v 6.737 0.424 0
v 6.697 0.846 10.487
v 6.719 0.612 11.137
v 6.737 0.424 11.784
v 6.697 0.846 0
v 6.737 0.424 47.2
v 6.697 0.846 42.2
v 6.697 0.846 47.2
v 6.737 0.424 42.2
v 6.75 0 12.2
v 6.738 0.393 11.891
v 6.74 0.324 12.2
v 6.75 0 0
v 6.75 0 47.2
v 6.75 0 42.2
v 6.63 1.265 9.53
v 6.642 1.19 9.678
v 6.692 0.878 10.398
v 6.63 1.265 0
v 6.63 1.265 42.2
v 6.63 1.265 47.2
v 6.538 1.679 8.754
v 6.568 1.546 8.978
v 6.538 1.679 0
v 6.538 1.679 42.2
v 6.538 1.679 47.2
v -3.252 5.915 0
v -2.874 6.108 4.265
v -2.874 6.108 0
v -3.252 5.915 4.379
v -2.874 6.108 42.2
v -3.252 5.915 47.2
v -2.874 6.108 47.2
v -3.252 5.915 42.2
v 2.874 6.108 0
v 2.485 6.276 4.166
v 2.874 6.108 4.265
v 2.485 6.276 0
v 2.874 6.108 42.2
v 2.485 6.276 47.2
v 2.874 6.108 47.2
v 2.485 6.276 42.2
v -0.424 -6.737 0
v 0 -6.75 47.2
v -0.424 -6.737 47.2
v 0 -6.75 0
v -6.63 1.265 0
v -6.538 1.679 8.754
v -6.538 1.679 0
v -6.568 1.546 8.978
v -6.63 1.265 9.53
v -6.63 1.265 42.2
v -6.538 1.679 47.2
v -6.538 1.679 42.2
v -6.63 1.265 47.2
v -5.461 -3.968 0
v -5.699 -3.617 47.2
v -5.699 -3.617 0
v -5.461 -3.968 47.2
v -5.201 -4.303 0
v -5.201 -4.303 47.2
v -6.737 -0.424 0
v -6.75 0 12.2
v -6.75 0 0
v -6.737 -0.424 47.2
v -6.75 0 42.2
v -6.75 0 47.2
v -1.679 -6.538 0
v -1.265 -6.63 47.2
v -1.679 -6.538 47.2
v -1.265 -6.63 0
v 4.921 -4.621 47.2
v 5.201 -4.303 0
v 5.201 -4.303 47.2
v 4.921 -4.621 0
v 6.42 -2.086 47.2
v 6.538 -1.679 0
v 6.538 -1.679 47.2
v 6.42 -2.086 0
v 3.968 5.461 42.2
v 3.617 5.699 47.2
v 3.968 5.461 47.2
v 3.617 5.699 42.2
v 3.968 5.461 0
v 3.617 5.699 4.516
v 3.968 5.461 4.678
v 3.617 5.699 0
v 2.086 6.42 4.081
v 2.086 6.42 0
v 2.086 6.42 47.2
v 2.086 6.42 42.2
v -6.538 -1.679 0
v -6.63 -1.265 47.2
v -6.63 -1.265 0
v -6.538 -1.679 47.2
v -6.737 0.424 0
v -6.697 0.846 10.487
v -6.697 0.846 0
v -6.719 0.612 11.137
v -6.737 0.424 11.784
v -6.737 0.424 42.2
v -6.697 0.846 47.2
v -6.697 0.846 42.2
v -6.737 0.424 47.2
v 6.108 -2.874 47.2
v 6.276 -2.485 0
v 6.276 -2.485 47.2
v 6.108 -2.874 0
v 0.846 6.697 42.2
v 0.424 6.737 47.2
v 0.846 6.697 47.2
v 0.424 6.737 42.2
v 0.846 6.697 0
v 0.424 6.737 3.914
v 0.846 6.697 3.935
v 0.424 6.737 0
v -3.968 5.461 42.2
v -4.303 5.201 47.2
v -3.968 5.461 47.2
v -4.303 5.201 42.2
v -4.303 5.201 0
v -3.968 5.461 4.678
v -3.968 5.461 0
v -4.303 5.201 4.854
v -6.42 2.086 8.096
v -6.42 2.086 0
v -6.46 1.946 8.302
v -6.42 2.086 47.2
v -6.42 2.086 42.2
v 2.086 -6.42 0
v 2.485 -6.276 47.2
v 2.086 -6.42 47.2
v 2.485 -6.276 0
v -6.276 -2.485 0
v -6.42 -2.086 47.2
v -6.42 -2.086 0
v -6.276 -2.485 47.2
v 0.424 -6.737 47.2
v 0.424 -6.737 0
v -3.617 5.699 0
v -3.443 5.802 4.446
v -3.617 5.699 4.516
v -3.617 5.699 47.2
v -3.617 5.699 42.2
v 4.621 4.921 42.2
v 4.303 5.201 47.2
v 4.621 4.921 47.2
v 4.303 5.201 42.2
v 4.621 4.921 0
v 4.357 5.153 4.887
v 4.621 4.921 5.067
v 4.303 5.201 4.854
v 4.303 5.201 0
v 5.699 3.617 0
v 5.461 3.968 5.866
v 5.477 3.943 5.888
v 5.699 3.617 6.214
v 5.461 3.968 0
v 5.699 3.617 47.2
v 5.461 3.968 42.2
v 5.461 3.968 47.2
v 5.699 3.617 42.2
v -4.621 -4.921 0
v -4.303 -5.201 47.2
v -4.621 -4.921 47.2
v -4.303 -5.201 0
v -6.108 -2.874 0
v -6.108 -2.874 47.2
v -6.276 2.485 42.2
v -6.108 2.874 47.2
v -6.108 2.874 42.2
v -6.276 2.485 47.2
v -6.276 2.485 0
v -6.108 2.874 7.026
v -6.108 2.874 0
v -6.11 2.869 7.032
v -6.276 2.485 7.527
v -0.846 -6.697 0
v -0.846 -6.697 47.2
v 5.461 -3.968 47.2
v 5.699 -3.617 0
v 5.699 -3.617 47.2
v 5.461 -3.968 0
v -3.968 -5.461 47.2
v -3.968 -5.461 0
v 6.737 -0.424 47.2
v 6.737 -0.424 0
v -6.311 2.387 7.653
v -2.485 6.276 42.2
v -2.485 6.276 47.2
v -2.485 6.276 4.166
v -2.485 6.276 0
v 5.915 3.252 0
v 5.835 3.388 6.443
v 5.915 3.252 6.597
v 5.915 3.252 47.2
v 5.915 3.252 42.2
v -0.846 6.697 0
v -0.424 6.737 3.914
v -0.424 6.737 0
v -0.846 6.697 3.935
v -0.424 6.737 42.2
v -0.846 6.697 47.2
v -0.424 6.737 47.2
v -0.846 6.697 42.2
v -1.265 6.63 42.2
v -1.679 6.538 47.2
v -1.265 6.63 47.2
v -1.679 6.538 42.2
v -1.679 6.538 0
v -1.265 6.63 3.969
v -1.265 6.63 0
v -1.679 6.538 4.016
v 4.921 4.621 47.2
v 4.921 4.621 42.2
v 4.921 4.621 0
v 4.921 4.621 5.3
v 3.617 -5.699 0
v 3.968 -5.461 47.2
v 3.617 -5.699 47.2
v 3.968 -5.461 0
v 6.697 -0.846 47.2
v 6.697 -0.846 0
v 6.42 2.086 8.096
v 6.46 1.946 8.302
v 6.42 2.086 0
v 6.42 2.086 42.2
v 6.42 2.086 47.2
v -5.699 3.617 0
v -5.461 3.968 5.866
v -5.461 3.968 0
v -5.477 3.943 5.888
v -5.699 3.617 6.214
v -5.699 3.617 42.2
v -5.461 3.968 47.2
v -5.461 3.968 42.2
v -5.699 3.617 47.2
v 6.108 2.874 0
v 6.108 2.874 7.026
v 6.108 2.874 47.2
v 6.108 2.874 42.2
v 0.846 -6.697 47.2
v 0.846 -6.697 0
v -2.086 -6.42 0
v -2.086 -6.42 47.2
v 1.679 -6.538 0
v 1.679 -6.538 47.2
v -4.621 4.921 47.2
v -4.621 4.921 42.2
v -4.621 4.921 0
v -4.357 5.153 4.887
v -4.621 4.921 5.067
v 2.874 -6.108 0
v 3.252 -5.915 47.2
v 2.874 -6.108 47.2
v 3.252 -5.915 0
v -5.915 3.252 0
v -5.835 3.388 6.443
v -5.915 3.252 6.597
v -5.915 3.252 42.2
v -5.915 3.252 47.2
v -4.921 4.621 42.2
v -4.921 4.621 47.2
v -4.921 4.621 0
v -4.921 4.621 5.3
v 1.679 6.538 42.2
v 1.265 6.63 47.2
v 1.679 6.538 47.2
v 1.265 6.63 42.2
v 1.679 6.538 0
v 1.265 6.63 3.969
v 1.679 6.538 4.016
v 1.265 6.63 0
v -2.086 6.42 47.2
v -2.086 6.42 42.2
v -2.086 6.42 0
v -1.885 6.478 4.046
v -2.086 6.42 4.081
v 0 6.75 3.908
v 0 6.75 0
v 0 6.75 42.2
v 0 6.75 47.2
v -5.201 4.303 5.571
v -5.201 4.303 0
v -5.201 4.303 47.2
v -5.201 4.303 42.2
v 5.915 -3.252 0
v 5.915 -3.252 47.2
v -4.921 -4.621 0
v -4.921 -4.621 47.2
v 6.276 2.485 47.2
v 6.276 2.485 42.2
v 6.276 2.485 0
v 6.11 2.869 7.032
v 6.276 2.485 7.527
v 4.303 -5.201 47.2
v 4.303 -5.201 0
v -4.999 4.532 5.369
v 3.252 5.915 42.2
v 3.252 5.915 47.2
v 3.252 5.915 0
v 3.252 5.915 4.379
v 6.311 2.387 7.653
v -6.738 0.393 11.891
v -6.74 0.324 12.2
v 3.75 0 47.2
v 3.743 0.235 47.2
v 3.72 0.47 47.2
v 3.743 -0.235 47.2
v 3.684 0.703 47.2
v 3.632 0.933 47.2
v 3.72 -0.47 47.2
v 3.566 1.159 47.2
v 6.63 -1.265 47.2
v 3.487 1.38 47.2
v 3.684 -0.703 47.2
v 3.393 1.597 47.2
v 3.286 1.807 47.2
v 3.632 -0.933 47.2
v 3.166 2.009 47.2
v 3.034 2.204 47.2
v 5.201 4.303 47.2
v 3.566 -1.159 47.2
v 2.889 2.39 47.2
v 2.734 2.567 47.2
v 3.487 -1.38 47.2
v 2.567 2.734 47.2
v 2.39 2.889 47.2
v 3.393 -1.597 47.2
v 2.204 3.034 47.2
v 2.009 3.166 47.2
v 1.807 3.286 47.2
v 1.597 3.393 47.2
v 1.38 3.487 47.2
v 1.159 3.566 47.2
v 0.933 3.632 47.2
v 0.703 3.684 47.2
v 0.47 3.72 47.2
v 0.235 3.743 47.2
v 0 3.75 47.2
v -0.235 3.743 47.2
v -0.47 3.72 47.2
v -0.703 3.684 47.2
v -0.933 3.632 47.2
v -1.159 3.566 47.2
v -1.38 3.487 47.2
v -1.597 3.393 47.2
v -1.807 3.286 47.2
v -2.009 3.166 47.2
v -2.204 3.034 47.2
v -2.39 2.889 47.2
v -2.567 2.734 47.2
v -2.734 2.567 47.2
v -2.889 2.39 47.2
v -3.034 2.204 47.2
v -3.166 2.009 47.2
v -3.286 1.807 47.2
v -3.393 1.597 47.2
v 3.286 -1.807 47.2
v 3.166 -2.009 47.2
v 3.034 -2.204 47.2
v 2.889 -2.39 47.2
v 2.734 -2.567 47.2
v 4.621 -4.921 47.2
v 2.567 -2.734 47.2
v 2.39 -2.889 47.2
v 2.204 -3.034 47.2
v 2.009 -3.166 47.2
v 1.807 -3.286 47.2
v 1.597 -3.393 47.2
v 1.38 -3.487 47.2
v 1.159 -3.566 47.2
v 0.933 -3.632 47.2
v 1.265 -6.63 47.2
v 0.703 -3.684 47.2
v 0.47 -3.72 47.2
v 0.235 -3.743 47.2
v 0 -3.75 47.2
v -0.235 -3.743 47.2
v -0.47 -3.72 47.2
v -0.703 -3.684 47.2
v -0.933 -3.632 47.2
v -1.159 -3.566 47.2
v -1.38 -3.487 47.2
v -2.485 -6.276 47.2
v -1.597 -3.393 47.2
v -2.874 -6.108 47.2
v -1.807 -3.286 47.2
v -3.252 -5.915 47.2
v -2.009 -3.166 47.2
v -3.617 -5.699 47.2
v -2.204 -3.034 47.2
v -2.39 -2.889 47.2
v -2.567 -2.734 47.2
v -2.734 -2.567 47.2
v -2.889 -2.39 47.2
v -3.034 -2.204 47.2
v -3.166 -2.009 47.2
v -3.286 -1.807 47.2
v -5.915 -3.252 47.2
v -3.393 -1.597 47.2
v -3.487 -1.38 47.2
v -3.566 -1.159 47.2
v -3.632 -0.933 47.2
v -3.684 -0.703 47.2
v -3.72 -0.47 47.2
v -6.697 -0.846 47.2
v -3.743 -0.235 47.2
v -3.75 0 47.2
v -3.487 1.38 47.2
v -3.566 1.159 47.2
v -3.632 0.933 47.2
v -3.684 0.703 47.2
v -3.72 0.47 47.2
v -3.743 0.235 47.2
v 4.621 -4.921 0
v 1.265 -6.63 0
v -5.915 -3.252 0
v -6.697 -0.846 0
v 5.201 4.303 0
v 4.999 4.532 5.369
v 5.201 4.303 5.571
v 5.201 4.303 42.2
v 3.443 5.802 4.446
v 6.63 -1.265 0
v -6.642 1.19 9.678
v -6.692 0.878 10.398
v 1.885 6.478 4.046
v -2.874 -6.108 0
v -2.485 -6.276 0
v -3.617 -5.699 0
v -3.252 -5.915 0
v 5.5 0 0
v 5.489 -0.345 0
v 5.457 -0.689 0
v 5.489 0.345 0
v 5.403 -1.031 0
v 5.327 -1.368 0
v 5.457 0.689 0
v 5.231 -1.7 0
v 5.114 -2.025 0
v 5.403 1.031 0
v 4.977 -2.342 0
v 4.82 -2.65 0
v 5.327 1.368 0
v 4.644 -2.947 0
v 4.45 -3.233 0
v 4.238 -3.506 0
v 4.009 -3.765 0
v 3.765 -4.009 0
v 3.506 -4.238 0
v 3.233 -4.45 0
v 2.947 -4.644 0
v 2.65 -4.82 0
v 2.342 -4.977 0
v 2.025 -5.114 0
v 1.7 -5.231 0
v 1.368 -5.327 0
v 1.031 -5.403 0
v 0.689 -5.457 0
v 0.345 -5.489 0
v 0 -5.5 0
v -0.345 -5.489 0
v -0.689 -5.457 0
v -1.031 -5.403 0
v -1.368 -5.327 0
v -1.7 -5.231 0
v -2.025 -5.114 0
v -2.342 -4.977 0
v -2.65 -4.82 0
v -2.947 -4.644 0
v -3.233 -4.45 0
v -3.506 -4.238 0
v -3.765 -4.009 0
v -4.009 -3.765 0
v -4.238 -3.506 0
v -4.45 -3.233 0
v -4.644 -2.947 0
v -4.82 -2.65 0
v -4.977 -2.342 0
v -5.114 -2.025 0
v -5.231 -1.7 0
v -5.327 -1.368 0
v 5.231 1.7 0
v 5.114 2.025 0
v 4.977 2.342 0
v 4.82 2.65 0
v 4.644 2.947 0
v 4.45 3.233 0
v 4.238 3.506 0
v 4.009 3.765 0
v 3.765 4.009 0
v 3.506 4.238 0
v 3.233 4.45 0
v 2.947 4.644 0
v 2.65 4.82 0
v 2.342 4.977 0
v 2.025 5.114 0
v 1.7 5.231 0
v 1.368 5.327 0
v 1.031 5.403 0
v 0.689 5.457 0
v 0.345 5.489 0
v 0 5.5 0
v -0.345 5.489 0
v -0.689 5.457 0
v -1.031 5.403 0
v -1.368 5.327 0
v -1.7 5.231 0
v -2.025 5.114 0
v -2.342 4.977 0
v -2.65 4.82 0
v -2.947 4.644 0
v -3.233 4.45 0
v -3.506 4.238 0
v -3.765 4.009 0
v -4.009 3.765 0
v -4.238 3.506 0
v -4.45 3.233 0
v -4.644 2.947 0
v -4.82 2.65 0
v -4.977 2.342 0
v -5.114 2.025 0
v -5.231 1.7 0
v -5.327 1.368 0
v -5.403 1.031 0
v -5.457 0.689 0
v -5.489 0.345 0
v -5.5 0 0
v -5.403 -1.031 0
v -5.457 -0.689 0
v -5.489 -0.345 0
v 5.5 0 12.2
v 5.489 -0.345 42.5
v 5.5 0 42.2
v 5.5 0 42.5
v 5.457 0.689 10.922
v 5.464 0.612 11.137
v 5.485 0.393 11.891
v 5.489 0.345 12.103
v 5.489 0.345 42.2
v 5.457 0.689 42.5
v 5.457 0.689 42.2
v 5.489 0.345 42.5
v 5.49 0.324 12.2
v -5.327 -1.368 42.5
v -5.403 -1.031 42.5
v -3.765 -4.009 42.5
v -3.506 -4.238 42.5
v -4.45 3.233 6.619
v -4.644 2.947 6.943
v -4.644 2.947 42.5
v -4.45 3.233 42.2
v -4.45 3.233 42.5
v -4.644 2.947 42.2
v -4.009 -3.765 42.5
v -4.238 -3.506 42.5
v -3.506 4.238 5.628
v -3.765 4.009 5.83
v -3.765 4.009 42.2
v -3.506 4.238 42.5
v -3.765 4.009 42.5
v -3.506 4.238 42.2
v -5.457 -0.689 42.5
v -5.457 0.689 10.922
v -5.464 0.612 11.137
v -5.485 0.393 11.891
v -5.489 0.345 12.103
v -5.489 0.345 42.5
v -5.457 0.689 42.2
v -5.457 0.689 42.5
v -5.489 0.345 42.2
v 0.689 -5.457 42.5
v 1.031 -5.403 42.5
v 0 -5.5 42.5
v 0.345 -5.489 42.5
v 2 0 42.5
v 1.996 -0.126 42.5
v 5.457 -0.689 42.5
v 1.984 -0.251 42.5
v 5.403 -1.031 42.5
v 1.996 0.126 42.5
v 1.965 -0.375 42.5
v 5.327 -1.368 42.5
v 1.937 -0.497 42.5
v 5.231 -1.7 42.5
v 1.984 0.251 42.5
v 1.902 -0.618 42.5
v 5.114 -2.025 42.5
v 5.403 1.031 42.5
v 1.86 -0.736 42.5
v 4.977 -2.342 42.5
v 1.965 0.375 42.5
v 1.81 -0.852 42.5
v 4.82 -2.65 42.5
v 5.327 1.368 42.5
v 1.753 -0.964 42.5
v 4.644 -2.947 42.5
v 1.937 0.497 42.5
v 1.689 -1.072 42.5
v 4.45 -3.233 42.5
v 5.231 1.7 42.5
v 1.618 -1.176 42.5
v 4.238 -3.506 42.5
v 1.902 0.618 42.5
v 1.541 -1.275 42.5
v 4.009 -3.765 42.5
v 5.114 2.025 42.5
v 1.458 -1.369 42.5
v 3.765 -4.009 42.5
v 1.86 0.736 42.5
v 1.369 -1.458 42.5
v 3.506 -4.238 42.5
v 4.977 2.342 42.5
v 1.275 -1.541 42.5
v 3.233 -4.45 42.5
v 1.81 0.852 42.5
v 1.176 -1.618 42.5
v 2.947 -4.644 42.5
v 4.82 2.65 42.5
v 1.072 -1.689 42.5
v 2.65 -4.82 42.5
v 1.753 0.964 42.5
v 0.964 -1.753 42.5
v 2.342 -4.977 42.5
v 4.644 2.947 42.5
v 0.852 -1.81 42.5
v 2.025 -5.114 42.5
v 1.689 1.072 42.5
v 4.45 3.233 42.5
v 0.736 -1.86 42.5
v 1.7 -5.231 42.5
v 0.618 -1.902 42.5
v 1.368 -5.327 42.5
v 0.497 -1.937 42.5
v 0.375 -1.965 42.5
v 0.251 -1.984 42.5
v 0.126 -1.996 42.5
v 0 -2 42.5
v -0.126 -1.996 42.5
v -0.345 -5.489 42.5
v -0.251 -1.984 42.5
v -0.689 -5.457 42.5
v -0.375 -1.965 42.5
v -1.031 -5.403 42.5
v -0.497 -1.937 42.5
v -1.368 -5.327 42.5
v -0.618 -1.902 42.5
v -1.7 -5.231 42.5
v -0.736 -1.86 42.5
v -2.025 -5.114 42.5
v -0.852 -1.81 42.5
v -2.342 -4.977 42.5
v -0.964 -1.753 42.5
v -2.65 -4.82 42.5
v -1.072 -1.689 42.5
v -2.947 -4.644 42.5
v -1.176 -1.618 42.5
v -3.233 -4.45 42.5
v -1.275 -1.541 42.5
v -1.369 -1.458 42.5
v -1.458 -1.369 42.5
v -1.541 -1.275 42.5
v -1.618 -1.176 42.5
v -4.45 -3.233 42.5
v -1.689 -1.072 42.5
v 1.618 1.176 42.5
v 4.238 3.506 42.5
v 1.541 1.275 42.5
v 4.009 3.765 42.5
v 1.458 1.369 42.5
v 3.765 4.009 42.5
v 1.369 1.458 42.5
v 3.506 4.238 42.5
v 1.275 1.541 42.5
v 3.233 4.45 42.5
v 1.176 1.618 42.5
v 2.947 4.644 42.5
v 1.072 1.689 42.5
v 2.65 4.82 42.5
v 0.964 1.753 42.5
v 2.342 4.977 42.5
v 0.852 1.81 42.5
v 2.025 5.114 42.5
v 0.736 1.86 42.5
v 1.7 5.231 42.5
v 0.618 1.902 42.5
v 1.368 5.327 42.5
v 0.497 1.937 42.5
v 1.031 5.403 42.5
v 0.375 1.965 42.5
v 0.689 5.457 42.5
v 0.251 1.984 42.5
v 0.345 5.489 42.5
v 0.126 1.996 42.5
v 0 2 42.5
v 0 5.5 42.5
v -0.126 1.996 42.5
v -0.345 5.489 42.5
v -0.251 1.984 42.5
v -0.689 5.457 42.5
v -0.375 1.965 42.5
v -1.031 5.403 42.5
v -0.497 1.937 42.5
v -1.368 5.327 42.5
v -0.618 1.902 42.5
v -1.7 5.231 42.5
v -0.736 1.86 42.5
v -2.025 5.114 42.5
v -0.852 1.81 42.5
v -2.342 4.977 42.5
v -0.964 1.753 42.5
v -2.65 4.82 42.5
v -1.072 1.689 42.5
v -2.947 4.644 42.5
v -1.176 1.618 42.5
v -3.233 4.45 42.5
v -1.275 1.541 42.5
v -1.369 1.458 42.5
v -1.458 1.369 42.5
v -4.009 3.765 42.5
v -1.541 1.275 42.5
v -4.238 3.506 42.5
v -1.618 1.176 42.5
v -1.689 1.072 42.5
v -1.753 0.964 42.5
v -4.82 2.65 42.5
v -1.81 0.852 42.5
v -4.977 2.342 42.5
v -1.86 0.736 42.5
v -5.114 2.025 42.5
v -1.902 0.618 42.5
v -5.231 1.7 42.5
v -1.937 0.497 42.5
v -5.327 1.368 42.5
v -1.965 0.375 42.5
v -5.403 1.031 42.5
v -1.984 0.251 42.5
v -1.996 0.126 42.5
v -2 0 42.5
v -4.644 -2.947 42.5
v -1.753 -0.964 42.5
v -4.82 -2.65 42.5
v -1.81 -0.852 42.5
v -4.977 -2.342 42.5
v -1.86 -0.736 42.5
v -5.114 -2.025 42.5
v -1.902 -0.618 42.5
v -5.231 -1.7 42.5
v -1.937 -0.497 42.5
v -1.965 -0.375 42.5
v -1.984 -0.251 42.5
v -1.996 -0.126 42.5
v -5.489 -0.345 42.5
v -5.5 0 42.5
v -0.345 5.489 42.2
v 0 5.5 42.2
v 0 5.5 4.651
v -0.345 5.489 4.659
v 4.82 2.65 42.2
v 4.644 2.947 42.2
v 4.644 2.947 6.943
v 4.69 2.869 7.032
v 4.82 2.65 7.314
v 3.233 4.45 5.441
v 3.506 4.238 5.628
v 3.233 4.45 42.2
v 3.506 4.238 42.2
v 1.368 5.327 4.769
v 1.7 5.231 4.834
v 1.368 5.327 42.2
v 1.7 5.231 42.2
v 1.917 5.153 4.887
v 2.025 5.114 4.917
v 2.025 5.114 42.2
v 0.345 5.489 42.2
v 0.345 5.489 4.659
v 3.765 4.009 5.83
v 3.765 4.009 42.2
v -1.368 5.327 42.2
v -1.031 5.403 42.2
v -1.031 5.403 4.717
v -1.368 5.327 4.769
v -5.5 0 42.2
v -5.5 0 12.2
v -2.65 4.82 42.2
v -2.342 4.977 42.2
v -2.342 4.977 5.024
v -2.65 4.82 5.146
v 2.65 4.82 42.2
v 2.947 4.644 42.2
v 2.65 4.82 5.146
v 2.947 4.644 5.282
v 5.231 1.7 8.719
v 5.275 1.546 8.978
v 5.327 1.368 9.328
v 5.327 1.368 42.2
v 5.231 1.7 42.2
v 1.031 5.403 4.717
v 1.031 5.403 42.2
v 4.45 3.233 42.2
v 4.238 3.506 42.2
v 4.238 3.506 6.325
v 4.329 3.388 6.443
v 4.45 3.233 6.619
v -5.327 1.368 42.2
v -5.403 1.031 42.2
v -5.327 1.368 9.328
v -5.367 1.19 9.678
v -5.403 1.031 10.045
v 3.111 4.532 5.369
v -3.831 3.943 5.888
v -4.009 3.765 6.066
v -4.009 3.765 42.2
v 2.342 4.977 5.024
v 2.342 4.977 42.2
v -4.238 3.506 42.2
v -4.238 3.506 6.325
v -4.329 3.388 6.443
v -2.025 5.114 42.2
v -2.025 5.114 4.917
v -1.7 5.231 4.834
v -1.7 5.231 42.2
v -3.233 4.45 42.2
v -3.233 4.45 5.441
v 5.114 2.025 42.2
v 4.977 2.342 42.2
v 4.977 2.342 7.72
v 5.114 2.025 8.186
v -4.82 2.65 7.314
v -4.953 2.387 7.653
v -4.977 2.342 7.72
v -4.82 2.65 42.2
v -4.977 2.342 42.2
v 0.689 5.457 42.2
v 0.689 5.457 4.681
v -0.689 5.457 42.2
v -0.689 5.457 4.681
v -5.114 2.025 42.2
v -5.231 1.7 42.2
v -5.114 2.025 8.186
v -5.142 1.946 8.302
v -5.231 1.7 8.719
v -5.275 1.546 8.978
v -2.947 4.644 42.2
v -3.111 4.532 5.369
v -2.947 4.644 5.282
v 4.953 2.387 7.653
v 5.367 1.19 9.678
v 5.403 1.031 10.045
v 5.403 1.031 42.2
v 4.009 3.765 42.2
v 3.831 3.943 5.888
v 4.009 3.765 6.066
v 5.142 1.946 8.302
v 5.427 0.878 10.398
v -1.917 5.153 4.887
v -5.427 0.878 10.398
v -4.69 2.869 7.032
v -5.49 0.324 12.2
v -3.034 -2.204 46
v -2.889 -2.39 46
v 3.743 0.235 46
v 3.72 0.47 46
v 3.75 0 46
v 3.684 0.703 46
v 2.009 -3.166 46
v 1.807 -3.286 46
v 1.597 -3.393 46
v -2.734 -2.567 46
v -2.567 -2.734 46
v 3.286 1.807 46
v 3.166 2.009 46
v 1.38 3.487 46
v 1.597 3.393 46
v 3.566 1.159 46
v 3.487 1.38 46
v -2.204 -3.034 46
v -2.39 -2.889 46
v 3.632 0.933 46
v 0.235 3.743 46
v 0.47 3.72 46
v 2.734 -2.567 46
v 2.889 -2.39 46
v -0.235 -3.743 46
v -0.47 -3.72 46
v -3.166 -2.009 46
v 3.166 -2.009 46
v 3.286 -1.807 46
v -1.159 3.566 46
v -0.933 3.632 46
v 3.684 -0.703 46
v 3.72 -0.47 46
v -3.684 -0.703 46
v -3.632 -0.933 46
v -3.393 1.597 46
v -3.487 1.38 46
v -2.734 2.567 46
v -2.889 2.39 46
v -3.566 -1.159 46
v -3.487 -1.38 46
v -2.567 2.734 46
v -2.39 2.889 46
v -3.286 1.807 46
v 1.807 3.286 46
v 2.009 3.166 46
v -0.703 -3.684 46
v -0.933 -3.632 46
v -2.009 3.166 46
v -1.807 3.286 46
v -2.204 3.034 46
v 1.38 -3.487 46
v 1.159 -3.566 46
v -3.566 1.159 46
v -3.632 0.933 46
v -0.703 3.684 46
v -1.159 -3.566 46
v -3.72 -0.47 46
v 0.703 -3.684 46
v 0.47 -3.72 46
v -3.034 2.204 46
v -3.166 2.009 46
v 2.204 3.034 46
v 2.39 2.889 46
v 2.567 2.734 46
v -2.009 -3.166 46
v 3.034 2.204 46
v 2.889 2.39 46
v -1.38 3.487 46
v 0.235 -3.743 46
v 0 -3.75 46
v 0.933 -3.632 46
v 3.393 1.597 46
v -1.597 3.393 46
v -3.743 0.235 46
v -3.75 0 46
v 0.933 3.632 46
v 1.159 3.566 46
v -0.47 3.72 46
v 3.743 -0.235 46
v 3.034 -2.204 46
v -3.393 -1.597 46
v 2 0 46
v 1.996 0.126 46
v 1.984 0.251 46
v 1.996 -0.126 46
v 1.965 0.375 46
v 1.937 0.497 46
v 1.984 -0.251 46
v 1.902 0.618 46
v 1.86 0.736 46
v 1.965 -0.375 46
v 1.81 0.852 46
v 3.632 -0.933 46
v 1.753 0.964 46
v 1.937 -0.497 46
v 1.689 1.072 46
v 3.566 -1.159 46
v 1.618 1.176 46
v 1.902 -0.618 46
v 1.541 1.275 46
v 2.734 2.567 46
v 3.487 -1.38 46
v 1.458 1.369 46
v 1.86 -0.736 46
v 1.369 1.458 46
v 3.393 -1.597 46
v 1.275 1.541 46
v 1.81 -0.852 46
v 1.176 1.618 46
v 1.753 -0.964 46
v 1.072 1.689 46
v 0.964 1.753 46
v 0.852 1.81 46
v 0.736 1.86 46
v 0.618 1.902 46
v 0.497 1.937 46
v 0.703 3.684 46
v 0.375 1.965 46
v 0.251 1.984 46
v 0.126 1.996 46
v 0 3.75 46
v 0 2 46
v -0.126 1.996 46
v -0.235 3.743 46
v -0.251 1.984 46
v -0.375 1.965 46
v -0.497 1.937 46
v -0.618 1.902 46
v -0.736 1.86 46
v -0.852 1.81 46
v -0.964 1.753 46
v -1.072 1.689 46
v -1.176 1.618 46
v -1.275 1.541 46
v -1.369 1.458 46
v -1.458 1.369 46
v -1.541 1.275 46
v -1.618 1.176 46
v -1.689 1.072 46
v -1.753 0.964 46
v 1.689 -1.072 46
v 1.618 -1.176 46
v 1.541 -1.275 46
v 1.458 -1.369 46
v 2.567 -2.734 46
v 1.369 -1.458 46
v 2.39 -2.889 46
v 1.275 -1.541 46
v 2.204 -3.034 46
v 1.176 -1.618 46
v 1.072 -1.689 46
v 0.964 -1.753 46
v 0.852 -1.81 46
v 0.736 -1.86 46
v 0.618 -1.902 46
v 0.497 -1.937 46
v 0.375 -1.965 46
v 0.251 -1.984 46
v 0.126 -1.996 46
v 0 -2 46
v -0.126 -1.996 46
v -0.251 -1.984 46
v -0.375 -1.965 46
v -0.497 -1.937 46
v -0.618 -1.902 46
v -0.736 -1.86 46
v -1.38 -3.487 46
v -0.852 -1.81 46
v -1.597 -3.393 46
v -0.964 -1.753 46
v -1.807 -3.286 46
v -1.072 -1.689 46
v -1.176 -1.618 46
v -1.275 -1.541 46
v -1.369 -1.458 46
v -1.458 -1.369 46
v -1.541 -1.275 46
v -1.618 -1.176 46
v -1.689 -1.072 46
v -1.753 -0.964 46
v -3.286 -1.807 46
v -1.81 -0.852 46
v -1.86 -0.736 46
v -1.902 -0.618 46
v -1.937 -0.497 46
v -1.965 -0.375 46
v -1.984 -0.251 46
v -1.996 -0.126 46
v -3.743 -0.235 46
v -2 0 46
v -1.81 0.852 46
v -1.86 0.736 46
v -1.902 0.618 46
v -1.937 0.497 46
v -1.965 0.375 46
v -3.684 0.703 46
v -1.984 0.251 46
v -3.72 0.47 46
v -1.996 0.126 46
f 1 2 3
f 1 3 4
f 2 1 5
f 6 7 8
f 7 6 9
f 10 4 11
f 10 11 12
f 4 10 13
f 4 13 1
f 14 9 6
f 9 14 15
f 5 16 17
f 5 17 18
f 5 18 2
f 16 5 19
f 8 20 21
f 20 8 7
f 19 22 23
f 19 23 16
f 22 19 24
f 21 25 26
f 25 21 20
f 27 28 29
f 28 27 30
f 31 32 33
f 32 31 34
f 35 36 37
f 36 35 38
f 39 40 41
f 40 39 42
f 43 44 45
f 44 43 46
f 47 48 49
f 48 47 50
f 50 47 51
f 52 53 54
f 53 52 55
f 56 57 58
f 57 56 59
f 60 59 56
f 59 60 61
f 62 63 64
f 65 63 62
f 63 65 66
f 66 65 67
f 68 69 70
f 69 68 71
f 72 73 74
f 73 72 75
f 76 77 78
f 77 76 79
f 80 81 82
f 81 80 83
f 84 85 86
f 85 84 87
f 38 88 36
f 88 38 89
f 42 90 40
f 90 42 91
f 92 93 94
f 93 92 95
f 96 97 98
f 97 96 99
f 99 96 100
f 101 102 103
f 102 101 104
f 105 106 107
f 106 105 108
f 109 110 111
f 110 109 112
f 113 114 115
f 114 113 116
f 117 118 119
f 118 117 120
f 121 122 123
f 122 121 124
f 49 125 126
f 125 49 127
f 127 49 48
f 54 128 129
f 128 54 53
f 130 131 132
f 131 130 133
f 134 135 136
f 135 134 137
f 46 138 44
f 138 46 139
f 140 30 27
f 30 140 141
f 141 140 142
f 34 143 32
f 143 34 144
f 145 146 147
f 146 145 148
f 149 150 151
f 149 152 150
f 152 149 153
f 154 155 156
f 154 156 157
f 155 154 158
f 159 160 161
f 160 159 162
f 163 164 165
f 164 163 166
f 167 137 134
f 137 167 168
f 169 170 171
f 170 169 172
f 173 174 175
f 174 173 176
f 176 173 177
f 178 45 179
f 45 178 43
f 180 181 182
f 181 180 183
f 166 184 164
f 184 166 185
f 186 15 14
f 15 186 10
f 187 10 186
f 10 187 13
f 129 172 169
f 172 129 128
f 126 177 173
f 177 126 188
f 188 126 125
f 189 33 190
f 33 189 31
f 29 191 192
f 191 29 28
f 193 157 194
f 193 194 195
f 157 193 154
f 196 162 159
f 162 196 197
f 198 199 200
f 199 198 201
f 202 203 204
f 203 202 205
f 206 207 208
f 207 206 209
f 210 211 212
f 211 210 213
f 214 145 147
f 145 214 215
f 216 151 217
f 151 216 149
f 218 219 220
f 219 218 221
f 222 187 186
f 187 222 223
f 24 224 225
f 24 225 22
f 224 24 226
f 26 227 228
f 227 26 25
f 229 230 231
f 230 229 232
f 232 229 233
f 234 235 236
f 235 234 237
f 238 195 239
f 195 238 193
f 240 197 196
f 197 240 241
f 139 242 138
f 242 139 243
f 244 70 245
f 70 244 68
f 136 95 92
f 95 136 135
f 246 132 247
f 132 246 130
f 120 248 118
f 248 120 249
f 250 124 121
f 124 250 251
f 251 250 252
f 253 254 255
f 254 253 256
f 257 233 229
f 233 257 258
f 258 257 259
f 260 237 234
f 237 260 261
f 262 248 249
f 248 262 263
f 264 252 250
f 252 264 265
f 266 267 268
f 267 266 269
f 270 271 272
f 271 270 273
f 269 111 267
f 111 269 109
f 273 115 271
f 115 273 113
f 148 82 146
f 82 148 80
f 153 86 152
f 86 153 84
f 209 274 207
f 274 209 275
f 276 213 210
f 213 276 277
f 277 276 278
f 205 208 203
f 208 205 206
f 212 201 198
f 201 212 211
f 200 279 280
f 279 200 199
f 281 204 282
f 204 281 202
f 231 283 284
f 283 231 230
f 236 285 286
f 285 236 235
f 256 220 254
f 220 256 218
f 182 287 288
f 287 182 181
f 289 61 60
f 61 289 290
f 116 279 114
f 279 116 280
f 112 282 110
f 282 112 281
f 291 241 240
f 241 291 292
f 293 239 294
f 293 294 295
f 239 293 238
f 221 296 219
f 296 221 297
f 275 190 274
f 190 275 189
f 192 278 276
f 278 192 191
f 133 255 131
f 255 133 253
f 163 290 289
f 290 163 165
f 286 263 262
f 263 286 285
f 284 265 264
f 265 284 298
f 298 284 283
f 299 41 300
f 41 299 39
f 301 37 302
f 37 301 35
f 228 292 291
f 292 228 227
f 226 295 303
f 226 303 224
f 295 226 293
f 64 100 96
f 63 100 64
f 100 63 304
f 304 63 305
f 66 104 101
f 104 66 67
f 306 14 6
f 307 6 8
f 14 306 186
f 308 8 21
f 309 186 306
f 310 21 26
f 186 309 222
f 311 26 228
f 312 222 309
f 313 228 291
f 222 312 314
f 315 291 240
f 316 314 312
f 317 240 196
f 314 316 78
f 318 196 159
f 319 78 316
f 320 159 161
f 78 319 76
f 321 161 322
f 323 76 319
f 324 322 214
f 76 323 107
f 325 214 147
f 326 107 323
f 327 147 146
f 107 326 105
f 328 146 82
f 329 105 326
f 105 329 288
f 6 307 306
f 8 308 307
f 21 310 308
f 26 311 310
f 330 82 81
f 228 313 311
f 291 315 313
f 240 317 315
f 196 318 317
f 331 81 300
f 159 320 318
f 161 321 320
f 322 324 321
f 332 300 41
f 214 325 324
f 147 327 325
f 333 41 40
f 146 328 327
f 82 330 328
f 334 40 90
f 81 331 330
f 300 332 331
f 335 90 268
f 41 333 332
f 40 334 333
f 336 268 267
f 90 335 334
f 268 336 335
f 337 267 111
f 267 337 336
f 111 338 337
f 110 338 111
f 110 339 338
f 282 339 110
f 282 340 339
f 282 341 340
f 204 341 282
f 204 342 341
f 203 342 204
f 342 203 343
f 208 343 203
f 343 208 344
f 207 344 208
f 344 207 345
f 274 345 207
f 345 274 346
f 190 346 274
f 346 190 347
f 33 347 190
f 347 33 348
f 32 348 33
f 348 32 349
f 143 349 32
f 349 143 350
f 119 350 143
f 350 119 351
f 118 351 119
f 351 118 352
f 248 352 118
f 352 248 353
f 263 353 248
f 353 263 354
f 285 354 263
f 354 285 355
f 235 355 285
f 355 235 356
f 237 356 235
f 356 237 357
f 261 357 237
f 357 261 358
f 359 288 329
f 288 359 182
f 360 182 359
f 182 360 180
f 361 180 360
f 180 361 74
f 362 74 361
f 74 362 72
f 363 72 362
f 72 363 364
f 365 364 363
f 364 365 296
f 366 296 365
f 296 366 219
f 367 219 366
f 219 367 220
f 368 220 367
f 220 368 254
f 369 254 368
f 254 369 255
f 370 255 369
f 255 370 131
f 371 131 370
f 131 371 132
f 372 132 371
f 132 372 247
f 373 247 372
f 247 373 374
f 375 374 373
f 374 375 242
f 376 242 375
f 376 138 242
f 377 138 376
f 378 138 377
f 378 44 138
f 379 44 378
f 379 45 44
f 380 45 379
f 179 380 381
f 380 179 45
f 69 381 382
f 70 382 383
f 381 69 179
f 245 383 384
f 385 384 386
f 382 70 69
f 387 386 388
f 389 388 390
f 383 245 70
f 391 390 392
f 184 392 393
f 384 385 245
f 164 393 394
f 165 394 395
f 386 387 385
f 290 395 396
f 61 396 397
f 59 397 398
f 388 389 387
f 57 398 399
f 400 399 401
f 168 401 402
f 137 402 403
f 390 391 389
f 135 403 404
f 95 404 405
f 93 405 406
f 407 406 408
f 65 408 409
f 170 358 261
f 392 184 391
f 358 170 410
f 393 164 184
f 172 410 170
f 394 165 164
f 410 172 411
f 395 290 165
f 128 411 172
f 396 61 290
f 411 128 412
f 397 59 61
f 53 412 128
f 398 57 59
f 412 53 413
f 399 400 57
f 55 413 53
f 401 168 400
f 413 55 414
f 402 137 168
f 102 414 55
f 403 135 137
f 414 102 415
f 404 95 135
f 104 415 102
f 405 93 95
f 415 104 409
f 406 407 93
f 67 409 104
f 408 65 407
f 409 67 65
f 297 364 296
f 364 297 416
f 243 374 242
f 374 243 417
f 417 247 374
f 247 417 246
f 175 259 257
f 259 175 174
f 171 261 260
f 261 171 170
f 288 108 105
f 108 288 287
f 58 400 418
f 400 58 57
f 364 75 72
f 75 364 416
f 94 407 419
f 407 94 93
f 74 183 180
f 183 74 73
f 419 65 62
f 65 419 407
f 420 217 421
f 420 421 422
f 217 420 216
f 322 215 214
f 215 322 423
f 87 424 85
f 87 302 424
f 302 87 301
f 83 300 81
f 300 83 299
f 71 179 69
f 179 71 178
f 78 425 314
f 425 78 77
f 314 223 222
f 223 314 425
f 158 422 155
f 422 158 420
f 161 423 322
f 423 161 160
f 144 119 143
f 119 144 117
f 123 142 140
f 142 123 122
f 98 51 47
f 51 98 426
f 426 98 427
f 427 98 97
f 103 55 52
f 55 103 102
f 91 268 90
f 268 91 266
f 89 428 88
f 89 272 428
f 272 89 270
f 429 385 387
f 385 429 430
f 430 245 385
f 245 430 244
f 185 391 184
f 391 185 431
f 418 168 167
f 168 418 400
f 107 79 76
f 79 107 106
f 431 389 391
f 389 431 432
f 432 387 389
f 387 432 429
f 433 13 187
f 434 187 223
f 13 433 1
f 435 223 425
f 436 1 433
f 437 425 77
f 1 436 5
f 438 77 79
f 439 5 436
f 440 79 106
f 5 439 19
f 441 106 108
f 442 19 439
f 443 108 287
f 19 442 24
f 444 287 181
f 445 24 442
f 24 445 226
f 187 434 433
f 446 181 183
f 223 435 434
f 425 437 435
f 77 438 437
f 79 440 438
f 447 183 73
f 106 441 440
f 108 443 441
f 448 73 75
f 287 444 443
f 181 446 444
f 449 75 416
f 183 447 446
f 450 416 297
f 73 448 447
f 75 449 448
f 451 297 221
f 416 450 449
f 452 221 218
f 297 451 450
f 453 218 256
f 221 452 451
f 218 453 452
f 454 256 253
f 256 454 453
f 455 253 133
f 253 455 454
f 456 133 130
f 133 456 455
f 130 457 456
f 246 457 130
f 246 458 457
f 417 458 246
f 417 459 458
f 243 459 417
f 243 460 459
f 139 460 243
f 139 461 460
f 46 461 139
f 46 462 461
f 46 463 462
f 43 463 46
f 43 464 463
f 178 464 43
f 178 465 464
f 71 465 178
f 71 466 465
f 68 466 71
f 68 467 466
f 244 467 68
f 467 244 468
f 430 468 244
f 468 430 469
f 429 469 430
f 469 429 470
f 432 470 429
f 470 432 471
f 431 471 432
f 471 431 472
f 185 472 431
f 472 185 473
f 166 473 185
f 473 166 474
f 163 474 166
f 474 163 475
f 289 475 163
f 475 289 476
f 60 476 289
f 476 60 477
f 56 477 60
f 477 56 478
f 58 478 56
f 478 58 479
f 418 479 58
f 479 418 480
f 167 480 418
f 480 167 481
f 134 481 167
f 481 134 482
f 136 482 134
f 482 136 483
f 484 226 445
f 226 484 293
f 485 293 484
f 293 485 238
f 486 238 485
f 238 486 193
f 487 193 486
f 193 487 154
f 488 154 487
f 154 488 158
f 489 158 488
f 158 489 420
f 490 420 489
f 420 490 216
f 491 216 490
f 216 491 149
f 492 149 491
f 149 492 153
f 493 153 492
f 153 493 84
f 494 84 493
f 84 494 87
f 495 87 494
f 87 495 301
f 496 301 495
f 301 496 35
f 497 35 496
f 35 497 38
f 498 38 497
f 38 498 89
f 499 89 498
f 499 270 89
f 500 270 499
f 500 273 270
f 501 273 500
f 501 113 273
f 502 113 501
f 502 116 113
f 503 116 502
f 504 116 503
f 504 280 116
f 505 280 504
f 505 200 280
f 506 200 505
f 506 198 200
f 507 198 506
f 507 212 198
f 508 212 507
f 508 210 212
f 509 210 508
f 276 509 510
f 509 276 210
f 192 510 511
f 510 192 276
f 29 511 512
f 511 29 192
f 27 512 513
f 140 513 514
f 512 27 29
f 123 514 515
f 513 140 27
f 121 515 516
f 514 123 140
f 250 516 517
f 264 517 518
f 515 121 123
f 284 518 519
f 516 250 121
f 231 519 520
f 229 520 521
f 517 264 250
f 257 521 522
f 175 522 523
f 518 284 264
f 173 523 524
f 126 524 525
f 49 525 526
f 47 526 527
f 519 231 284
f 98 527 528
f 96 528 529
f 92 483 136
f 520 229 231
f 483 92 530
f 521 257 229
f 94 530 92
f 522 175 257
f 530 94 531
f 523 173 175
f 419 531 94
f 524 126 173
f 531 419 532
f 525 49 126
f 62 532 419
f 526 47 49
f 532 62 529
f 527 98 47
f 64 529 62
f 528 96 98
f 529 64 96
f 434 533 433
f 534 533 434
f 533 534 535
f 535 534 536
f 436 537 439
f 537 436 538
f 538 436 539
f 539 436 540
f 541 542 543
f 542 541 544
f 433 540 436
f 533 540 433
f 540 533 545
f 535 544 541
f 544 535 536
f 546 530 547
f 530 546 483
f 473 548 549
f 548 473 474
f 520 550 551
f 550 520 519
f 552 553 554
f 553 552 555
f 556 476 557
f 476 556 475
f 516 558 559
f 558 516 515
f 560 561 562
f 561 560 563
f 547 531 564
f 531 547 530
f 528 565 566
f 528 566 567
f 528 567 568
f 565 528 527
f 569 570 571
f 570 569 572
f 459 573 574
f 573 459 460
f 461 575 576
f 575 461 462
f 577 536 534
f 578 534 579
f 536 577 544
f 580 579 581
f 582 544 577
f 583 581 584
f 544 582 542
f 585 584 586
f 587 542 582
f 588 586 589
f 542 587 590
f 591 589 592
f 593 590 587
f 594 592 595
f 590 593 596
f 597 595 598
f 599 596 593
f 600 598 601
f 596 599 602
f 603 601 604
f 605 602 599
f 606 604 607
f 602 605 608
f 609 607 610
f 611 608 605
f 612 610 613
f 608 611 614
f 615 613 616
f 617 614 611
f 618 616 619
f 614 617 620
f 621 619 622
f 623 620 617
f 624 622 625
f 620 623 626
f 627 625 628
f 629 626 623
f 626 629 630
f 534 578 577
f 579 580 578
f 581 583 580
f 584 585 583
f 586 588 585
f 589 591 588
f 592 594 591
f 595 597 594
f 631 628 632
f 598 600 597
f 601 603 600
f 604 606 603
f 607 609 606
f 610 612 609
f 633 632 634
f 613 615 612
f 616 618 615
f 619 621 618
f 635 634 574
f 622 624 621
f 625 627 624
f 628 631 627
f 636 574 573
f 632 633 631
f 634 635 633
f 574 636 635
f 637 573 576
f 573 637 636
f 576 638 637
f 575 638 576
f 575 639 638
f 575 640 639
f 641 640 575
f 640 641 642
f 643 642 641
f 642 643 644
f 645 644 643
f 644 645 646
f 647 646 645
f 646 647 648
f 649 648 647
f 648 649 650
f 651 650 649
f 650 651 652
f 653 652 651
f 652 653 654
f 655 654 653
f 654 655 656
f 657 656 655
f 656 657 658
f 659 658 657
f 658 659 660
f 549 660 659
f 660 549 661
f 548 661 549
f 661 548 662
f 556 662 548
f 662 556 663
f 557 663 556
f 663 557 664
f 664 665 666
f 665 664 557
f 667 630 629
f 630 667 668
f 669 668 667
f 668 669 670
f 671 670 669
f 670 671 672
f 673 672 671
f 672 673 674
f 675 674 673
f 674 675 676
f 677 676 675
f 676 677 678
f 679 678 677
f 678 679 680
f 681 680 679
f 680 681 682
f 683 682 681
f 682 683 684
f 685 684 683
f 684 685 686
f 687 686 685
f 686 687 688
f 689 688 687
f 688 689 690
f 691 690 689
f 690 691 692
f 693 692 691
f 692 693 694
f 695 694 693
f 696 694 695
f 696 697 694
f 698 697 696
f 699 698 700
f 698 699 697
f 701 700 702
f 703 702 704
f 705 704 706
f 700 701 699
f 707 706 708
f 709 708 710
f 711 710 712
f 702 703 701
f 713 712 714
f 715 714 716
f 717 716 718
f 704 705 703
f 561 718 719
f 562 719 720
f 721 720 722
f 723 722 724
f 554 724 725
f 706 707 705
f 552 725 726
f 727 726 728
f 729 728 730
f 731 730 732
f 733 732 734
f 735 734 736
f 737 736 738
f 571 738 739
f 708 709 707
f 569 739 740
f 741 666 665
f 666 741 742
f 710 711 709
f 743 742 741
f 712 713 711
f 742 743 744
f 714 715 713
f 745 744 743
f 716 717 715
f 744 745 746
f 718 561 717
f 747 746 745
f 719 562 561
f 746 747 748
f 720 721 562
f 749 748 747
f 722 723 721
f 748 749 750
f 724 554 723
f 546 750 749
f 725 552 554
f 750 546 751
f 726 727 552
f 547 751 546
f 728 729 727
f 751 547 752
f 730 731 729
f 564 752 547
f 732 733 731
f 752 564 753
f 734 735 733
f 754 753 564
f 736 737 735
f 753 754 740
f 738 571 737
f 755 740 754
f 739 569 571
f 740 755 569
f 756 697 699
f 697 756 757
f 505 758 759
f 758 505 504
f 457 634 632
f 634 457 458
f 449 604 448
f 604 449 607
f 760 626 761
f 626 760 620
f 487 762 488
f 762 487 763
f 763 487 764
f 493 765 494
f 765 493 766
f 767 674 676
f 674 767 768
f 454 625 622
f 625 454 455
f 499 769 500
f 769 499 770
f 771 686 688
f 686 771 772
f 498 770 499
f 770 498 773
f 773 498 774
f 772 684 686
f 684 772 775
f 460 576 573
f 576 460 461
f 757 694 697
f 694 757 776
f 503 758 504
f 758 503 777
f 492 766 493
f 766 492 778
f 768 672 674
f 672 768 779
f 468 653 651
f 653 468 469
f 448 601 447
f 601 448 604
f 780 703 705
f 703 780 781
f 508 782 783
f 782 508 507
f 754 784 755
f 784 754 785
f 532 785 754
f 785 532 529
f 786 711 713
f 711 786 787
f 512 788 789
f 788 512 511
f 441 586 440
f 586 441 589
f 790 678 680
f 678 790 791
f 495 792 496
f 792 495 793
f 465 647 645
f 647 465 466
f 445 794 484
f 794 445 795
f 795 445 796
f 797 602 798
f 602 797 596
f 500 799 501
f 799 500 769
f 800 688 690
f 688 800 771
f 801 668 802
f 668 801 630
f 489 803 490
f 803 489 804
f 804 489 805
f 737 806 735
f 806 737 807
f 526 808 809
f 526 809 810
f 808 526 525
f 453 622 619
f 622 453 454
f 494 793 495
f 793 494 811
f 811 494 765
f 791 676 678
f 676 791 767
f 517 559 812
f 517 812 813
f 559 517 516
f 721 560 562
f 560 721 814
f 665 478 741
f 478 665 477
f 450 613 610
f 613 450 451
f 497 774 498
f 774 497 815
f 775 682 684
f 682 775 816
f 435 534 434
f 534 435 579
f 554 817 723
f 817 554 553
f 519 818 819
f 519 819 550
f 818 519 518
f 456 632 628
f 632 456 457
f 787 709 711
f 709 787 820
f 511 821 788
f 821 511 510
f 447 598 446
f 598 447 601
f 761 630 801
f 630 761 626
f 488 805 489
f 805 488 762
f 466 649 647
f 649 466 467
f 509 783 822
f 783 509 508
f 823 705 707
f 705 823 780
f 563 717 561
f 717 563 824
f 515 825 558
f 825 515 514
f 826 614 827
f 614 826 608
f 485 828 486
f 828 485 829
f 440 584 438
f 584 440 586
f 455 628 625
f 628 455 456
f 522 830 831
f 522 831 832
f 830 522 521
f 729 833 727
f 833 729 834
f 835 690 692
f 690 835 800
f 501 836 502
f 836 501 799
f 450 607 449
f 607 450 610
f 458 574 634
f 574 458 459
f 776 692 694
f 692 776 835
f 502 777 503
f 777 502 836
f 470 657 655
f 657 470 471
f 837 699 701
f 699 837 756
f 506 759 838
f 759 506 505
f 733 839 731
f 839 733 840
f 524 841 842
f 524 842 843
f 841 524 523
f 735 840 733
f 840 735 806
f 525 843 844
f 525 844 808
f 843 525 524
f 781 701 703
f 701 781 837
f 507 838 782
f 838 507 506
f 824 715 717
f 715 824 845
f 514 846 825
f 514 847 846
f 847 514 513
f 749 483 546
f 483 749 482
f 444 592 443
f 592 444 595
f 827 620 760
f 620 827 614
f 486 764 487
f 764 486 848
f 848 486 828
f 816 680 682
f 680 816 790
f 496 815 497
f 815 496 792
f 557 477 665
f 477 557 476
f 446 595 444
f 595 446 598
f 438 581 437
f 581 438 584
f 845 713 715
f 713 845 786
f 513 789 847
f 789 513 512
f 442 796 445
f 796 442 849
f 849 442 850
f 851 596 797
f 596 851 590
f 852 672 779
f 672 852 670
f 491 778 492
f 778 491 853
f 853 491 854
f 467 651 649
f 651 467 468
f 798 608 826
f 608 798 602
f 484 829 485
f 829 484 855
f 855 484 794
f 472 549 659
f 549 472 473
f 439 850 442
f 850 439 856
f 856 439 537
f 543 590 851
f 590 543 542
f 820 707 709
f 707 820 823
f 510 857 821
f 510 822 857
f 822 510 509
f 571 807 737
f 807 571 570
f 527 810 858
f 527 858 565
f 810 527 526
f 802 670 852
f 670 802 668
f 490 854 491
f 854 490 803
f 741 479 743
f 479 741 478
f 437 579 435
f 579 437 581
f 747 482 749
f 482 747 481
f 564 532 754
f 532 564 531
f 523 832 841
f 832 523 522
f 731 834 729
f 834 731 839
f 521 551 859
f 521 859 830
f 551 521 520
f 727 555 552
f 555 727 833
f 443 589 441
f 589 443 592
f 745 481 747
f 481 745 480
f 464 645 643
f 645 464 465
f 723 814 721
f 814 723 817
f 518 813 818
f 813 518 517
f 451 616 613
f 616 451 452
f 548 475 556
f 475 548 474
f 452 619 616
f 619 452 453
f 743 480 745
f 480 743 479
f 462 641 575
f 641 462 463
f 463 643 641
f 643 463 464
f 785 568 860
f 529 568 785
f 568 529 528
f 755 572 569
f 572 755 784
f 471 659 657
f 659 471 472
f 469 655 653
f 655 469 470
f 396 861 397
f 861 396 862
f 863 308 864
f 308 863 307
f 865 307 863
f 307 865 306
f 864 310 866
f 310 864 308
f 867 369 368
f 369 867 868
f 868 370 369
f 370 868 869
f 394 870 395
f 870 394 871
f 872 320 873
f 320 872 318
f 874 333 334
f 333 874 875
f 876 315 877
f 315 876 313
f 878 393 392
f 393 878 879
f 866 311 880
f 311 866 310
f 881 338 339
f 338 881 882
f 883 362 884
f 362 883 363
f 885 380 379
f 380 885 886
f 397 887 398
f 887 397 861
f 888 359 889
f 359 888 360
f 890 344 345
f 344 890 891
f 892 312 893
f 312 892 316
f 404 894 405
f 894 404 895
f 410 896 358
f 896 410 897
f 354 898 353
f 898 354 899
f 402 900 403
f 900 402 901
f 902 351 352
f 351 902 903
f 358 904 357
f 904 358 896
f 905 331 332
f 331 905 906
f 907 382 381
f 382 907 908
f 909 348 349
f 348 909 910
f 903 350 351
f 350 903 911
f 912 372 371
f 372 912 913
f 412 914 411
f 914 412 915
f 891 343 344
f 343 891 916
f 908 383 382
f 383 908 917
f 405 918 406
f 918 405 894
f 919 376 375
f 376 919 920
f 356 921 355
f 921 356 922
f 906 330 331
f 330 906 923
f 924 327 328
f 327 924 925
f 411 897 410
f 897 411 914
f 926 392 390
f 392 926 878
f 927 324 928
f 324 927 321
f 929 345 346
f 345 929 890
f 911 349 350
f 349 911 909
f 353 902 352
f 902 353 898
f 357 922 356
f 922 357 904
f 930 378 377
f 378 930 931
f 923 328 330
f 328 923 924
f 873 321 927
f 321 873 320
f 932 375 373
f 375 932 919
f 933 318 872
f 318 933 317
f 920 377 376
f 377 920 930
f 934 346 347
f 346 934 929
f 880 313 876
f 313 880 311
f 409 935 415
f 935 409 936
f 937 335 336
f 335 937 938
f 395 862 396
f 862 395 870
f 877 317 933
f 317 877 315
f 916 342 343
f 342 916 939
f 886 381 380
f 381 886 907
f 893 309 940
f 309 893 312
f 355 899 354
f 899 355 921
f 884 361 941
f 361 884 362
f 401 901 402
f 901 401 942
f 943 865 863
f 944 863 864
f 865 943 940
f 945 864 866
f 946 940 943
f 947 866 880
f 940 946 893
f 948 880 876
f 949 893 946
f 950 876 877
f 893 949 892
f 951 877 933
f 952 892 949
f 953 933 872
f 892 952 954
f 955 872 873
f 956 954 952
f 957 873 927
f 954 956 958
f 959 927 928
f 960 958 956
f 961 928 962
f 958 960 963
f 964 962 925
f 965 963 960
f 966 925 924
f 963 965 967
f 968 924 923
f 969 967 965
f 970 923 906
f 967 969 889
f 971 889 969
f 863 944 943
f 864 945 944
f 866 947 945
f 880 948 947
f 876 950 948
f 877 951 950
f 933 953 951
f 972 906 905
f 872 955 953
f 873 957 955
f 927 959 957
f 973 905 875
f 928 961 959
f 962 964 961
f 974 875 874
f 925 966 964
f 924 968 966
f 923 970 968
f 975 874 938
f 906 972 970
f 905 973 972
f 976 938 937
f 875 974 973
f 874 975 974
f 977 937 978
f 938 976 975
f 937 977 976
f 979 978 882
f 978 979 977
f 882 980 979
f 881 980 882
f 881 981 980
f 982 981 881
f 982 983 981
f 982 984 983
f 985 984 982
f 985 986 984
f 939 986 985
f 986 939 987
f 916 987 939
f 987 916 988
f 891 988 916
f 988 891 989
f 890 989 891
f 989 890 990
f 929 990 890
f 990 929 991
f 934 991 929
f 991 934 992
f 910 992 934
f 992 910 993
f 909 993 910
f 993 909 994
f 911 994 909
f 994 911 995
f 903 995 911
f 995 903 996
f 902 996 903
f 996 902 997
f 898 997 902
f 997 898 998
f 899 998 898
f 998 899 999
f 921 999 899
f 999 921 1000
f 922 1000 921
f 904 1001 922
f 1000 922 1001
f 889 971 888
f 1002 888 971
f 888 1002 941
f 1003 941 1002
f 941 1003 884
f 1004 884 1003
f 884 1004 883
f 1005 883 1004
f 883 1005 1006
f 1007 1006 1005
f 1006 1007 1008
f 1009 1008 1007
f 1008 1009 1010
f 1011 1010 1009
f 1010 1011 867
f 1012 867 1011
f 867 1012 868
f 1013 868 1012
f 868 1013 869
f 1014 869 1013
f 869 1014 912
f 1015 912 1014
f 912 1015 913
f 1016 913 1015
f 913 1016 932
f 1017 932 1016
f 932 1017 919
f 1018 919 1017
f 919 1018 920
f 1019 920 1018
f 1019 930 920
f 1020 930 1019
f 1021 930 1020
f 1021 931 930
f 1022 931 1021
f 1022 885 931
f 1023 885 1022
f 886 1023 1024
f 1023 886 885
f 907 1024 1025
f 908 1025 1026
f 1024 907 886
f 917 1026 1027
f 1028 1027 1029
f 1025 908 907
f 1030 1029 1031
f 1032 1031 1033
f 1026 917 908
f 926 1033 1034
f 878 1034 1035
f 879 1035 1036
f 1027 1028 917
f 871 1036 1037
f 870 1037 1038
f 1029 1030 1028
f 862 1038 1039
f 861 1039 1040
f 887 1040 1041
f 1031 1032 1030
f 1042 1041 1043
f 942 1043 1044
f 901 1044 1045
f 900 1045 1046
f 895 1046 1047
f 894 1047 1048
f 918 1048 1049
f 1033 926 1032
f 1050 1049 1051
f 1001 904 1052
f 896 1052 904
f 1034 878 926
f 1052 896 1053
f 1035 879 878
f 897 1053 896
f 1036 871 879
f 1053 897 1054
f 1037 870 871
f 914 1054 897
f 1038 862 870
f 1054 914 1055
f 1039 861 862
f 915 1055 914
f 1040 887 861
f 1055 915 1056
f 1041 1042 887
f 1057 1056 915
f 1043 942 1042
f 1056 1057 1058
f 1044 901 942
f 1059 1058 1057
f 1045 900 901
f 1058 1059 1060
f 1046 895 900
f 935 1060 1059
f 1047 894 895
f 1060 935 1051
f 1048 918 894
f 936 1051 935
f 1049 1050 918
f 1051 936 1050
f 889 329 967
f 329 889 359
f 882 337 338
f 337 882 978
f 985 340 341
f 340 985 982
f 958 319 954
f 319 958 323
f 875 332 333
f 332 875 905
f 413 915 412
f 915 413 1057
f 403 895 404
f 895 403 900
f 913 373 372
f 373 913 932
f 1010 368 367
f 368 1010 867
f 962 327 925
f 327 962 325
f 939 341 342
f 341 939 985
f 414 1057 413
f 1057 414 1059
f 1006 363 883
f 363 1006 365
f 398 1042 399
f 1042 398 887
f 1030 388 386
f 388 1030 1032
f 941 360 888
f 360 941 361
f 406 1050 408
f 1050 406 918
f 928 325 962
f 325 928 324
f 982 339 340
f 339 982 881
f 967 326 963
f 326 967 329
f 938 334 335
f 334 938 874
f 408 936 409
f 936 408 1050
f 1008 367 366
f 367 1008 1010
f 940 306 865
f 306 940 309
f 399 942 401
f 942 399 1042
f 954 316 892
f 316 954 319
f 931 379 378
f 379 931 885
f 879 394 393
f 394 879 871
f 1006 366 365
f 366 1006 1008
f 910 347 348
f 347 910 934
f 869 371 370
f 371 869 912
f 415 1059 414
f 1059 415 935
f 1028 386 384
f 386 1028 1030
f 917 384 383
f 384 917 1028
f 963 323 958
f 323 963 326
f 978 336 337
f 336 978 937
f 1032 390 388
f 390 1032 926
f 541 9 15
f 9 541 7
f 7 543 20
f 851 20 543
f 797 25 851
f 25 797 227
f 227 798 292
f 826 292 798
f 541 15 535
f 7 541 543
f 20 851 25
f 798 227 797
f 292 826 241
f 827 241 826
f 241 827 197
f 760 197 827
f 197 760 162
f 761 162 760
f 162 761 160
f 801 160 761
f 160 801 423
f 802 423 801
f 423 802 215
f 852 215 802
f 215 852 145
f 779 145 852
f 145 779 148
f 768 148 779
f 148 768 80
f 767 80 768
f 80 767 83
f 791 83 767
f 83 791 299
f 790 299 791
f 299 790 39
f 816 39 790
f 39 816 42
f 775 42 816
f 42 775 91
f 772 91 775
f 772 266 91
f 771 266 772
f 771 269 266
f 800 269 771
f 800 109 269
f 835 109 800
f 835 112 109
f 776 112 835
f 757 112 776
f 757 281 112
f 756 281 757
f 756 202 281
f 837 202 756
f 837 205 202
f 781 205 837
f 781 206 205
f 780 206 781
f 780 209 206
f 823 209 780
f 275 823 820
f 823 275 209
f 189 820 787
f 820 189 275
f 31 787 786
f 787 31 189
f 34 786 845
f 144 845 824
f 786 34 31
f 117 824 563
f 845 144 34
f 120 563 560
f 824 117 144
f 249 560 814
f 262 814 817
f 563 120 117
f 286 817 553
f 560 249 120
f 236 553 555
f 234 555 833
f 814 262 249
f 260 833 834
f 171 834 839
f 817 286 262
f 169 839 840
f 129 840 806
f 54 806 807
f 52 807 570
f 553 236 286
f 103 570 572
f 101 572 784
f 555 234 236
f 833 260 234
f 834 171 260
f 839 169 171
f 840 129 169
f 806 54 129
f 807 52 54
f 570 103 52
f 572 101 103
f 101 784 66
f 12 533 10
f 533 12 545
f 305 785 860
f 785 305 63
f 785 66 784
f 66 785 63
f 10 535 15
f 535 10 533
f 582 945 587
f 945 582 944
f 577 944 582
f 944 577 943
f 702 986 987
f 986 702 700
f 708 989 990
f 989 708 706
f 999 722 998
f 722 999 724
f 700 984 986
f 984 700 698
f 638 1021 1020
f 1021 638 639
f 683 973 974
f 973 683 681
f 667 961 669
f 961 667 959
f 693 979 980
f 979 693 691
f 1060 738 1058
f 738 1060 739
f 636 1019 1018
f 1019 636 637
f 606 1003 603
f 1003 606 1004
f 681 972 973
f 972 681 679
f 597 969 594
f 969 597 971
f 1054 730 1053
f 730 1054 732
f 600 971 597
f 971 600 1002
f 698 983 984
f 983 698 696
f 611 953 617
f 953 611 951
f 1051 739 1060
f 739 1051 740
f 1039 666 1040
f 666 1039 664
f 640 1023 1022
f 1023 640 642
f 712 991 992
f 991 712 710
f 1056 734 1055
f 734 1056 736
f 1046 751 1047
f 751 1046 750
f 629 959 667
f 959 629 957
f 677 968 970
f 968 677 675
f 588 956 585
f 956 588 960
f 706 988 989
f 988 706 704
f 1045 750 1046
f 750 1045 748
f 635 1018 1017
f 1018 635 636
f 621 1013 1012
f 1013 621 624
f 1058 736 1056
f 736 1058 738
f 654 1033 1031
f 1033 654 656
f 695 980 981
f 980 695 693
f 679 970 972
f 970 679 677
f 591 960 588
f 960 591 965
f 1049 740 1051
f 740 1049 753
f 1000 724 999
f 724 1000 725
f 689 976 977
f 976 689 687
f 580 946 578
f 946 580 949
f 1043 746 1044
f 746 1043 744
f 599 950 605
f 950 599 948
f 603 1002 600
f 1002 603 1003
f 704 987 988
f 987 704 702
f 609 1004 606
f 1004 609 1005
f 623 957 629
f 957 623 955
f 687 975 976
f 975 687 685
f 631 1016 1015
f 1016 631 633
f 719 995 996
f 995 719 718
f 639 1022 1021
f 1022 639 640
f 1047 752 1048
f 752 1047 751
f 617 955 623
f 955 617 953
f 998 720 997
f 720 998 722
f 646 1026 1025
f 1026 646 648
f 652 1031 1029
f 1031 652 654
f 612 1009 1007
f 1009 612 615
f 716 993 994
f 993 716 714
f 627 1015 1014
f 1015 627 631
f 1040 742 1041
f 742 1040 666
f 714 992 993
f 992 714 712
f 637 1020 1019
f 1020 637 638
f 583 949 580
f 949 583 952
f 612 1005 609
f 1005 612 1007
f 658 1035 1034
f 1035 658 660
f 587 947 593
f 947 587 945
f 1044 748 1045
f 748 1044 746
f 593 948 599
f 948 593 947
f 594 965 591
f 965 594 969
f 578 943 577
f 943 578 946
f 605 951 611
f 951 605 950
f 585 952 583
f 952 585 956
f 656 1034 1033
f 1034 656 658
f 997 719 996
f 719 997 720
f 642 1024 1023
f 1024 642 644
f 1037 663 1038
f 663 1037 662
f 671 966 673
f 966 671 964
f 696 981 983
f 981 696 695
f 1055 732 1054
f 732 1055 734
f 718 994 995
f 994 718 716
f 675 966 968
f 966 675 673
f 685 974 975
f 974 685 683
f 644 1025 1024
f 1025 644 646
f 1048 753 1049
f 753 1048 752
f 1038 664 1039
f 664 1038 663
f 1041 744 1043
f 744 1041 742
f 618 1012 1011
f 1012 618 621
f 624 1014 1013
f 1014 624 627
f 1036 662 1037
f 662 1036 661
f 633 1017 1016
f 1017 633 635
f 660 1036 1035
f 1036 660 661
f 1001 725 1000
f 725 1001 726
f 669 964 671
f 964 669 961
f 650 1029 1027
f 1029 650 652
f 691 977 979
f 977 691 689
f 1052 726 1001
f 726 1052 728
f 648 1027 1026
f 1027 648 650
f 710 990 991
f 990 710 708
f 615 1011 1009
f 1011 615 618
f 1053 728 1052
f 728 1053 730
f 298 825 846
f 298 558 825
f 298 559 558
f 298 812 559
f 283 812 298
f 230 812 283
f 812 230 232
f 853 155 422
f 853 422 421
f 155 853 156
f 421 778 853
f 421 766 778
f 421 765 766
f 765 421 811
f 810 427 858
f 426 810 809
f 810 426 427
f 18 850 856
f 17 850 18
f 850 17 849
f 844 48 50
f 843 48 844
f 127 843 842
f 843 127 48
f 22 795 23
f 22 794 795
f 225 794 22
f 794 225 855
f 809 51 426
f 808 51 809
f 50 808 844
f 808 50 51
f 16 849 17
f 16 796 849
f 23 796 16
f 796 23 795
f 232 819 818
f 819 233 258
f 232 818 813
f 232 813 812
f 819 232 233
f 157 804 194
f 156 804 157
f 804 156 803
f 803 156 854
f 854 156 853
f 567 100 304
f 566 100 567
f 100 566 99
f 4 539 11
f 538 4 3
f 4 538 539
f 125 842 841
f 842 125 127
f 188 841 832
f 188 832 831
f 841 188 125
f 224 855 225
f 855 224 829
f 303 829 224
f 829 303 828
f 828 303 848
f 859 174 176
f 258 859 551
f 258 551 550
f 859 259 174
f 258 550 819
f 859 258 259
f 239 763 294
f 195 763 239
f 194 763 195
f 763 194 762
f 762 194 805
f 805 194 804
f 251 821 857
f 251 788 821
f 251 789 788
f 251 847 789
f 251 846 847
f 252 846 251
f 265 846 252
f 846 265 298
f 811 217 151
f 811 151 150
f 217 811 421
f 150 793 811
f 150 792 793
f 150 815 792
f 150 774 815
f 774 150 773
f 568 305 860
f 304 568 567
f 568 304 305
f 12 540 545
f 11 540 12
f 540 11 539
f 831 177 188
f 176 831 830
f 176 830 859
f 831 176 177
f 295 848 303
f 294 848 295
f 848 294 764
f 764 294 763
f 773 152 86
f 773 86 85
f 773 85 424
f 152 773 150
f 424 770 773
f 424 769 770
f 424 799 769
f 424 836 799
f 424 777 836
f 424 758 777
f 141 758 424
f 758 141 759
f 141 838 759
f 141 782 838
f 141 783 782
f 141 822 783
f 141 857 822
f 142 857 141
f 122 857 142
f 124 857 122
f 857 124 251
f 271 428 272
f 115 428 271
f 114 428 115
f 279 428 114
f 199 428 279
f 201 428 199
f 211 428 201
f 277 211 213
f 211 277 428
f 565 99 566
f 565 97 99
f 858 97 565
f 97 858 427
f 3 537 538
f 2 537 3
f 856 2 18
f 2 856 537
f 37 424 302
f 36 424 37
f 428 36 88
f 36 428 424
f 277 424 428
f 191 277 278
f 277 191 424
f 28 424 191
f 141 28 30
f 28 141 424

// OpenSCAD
aaa_diameter=11; 
aaa_height=42.5; 
aa_diameter=13.5;
aa_height=47.2;
niche_length=30;
cathode_diameter=4;

difference(){
cylinder(d=aa_diameter,h=aa_height,$fn=100);
cylinder(d=aaa_diameter,h=aaa_height,$fn=100);
translate([0,0,46]){
cylinder(d=7.5,h=2,$fn=100);};
translate([-(aa_diameter/2),0,(aa_height-niche_length)-5]){
    cube(size=[aa_diameter,aa_diameter,niche_length]);}
translate([0,0,1]){
    cylinder(d=cathode_diameter,h=aa_height,$fn=100);}
translate([-10,12.5,15]){
    rotate([0,90,0]){
        cylinder(d=25,h=20,$fn=100);}}
};
